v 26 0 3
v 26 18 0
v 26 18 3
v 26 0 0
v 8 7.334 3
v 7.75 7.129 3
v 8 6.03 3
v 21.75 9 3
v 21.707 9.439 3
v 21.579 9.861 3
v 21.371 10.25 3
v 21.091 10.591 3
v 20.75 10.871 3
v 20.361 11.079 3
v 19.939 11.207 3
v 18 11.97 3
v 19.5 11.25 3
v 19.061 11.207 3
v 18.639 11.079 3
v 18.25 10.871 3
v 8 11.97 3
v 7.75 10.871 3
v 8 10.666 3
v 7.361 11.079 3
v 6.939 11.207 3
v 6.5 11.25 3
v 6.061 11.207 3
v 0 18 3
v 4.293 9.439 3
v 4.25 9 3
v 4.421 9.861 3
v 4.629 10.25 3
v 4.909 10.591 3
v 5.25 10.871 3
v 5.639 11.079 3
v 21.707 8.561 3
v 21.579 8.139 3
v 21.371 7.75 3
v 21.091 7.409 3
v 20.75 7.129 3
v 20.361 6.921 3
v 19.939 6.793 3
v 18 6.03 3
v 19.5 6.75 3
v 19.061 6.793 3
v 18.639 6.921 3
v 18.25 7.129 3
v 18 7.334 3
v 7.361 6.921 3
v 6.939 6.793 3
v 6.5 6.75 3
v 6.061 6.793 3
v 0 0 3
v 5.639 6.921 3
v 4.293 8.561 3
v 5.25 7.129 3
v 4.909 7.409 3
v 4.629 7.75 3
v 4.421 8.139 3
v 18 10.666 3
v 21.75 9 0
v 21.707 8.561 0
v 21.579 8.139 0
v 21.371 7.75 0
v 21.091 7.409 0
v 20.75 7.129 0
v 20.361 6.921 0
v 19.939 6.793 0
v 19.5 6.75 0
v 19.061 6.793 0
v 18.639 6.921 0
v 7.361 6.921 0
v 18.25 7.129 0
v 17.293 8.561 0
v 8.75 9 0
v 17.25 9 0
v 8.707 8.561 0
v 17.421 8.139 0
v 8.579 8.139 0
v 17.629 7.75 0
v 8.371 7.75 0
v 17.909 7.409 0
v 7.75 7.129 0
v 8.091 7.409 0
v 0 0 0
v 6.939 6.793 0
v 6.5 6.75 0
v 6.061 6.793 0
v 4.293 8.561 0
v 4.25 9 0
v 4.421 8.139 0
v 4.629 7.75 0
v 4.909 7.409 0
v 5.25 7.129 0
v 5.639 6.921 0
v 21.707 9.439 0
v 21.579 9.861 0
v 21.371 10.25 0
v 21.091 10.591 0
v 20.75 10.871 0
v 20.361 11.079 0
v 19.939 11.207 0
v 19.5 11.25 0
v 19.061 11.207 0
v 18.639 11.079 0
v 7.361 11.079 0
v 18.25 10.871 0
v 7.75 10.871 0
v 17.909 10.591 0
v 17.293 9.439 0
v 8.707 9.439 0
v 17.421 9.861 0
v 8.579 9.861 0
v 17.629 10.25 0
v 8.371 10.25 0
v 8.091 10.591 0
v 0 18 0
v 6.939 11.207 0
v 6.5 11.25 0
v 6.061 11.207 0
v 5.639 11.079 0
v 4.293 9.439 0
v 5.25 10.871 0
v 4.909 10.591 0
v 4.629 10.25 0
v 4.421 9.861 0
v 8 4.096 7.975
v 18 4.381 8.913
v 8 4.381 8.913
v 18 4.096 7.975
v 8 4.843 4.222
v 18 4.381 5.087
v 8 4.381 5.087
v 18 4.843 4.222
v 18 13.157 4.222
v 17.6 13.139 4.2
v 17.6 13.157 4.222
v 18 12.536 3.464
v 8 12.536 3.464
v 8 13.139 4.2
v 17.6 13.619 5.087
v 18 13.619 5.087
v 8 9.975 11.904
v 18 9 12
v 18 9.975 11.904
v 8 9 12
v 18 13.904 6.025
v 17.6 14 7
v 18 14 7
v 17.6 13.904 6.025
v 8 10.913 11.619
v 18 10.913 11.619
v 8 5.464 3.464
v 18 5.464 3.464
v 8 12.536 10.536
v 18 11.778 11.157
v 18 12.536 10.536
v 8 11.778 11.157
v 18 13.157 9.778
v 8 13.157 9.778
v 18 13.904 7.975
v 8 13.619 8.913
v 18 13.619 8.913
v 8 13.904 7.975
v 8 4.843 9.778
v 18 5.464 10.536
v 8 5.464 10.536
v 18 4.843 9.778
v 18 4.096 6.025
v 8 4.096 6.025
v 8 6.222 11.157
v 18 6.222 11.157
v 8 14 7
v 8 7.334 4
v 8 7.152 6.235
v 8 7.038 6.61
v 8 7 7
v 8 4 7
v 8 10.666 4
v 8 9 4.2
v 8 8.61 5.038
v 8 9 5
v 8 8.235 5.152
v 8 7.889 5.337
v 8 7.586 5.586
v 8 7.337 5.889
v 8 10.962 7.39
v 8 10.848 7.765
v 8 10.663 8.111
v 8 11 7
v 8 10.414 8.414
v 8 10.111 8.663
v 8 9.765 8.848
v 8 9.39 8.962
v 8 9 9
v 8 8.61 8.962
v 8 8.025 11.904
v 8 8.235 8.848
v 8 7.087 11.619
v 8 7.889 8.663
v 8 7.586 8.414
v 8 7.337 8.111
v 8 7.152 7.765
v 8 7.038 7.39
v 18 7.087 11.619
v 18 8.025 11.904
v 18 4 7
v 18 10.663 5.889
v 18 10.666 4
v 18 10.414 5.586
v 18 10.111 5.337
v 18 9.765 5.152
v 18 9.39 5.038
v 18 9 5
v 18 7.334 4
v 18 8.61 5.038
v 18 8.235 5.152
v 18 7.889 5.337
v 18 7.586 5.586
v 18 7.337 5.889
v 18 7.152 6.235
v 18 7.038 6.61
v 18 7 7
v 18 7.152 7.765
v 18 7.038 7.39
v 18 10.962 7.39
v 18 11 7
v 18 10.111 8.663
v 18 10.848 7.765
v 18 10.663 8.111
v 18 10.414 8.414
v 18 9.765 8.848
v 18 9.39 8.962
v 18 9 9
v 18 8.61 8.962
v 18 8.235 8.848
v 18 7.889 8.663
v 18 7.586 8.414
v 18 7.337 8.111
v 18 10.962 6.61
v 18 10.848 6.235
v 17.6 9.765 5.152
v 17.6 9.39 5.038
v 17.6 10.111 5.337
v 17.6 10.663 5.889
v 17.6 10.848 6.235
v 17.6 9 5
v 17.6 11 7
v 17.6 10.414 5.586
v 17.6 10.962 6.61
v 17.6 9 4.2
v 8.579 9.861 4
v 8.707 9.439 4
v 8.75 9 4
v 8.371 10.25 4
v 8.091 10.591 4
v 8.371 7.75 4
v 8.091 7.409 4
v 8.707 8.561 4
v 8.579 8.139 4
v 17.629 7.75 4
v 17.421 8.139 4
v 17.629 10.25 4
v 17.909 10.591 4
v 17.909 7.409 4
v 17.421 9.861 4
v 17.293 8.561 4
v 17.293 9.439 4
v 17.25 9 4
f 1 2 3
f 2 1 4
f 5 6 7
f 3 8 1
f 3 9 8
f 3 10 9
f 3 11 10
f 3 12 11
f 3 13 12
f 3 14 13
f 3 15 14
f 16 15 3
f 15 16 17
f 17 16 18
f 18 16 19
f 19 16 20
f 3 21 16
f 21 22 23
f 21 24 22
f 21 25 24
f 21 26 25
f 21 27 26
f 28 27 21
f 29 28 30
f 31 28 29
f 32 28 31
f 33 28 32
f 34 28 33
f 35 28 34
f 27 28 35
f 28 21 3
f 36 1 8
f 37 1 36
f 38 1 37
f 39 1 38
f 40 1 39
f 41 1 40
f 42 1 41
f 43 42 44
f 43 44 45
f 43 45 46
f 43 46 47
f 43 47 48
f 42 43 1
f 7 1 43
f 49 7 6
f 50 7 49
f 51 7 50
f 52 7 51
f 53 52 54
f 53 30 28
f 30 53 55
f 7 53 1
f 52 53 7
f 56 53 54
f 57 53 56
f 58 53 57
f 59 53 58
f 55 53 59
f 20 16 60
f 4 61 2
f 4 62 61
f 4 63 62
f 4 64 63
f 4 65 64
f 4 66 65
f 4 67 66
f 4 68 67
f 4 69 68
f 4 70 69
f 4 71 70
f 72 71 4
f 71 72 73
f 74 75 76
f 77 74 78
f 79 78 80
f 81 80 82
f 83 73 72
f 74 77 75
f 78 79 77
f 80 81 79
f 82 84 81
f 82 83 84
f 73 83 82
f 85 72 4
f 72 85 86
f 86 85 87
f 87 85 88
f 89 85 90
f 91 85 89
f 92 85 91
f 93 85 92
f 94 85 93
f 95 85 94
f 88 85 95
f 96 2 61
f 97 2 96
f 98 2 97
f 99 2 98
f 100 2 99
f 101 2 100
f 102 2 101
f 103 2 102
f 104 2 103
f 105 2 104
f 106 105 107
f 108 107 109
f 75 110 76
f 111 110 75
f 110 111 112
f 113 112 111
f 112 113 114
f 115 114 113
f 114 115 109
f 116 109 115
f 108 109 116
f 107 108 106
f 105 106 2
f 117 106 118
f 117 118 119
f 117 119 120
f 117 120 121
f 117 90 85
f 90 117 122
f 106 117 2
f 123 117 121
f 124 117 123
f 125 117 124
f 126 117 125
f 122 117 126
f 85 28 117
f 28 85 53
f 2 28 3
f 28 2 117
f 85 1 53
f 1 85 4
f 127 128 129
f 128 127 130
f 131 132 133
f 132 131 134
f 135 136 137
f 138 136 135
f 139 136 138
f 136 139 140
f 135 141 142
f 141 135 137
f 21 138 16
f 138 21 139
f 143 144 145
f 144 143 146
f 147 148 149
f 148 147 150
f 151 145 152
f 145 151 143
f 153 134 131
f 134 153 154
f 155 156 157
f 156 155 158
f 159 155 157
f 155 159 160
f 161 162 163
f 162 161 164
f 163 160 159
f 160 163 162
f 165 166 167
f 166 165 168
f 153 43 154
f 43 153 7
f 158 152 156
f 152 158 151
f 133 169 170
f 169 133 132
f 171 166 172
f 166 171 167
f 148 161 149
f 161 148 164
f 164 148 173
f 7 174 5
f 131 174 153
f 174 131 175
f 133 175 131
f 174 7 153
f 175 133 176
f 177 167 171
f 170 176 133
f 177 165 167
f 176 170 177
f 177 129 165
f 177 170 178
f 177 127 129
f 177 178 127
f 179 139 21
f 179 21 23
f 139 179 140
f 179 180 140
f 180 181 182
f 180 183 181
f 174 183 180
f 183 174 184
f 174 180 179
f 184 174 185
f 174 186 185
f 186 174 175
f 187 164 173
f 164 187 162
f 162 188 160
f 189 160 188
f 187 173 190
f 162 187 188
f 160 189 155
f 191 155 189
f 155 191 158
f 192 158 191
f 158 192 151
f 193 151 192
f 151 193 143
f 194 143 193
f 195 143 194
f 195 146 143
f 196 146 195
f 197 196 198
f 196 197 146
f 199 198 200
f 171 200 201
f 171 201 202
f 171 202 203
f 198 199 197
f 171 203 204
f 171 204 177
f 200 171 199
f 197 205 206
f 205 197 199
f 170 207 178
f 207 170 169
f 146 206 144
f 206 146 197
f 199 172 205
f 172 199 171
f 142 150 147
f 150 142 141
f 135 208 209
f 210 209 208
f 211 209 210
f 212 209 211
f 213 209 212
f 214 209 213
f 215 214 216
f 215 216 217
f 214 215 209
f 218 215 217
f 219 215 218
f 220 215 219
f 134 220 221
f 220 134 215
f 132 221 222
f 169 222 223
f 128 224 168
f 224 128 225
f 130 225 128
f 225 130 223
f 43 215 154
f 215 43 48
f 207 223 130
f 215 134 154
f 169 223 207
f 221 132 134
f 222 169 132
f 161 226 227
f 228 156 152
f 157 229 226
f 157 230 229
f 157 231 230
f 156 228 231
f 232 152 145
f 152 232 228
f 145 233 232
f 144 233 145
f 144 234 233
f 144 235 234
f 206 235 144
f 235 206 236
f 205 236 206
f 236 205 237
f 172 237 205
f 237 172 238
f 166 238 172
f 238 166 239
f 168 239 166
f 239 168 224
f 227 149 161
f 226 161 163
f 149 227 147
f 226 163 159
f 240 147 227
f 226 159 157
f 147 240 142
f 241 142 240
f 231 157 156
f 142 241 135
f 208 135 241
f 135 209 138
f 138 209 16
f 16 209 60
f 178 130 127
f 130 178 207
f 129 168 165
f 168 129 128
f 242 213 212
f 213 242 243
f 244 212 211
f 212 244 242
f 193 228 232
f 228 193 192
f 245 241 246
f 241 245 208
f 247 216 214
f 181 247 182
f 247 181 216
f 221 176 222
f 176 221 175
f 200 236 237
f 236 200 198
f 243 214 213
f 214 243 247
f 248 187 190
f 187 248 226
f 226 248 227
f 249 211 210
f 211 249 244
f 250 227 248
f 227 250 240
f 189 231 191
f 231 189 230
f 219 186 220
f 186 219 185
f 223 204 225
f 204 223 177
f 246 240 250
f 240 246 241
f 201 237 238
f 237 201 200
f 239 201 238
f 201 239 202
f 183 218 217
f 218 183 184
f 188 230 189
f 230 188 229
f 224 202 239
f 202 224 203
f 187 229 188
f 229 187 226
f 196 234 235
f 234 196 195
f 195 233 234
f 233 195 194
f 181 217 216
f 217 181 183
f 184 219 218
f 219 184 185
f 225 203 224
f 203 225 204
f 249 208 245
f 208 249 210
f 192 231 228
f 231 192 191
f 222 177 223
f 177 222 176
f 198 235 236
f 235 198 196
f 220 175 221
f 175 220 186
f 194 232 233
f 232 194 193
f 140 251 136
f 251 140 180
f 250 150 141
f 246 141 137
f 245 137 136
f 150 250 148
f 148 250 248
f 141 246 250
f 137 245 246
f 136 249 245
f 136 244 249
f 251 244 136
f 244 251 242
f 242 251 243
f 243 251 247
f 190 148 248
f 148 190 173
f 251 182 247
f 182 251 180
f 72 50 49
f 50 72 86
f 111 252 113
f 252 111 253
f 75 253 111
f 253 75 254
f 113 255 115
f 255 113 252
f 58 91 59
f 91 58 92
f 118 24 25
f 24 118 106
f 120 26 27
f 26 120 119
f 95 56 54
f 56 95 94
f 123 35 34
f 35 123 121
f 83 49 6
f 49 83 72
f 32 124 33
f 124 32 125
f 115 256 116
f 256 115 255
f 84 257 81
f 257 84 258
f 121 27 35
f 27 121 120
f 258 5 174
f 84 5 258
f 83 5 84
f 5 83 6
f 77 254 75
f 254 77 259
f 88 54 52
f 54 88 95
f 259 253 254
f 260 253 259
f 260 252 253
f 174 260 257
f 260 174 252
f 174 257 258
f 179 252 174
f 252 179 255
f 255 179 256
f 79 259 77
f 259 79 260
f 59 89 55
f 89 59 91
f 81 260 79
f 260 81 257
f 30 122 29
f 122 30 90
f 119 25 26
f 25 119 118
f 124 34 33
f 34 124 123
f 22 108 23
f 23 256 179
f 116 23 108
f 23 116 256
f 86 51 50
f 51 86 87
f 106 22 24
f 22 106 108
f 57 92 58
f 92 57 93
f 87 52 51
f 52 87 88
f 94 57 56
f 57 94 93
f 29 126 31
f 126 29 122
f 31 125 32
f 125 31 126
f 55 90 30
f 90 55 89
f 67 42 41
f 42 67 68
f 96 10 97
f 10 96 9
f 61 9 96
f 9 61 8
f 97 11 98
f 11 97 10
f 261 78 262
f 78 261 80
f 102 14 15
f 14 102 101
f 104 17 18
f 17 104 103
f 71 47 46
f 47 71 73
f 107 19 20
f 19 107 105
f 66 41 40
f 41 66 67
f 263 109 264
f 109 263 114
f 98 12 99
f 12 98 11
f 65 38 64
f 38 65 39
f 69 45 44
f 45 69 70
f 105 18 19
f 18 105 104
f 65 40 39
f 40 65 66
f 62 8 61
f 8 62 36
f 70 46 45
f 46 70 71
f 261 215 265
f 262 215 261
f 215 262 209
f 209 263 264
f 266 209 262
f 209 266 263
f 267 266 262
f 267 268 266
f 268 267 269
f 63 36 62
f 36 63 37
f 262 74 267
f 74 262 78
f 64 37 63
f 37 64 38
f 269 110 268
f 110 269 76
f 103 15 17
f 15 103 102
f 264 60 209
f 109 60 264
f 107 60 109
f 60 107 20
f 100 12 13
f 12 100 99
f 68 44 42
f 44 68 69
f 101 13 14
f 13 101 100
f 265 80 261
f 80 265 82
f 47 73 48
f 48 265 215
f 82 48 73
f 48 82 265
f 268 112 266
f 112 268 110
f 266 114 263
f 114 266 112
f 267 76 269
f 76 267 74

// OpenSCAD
$fn = 32;

// ----------------------------------------------------------------------
// Cable clip: cable 4 mm, clamp 10 mm, base 26 mm
// ----------------------------------------------------------------------

// --- parameters (mm) ---
plate_x = 26;             // base length, X
plate_y = 18;             // base width, Y
plate_t = 3;              // base thickness
wire_seat_d = 10;         // clamp outside diameter
clip_t = 3;               // clamp wall
cable_d = 4;              // cable opening
ring_w = 10;              // clamp width along the cable
screw_d = 4.5;            // screw clearance
throat = 2.8;             // snap throat width
sink = 1;                 // overlap of the clamp into the base

module base() {
  cube([plate_x, plate_y, plate_t]);
}

module clamp() {
  translate([plate_x / 2, plate_y / 2, plate_t + wire_seat_d / 2 - sink]) rotate([0, 90, 0])
    cylinder(h = ring_w, d = wire_seat_d, center = true);
}

difference() {
  union() {
    base();
    clamp();
  }
  translate([plate_x / 2, plate_y / 2, plate_t + wire_seat_d / 2 - sink]) rotate([0, 90, 0]) translate([0, 0, -ring_w / 2 - 1]) cylinder(h = ring_w + 2, d = cable_d);
  /* snap throat: the opening is narrower than the cable */
  translate([plate_x / 2 - throat / 2, plate_y / 2, plate_t + wire_seat_d / 2 - sink]) rotate([0, 90, 0]) translate([0, 0, -ring_w / 2 - 1]) cube([throat, wire_seat_d + 2, ring_w + 2]);
  translate([6.5, plate_y / 2, -1]) cylinder(h = plate_t + 2, d = screw_d);
  translate([19.5, plate_y / 2, -1]) cylinder(h = plate_t + 2, d = screw_d);
}
